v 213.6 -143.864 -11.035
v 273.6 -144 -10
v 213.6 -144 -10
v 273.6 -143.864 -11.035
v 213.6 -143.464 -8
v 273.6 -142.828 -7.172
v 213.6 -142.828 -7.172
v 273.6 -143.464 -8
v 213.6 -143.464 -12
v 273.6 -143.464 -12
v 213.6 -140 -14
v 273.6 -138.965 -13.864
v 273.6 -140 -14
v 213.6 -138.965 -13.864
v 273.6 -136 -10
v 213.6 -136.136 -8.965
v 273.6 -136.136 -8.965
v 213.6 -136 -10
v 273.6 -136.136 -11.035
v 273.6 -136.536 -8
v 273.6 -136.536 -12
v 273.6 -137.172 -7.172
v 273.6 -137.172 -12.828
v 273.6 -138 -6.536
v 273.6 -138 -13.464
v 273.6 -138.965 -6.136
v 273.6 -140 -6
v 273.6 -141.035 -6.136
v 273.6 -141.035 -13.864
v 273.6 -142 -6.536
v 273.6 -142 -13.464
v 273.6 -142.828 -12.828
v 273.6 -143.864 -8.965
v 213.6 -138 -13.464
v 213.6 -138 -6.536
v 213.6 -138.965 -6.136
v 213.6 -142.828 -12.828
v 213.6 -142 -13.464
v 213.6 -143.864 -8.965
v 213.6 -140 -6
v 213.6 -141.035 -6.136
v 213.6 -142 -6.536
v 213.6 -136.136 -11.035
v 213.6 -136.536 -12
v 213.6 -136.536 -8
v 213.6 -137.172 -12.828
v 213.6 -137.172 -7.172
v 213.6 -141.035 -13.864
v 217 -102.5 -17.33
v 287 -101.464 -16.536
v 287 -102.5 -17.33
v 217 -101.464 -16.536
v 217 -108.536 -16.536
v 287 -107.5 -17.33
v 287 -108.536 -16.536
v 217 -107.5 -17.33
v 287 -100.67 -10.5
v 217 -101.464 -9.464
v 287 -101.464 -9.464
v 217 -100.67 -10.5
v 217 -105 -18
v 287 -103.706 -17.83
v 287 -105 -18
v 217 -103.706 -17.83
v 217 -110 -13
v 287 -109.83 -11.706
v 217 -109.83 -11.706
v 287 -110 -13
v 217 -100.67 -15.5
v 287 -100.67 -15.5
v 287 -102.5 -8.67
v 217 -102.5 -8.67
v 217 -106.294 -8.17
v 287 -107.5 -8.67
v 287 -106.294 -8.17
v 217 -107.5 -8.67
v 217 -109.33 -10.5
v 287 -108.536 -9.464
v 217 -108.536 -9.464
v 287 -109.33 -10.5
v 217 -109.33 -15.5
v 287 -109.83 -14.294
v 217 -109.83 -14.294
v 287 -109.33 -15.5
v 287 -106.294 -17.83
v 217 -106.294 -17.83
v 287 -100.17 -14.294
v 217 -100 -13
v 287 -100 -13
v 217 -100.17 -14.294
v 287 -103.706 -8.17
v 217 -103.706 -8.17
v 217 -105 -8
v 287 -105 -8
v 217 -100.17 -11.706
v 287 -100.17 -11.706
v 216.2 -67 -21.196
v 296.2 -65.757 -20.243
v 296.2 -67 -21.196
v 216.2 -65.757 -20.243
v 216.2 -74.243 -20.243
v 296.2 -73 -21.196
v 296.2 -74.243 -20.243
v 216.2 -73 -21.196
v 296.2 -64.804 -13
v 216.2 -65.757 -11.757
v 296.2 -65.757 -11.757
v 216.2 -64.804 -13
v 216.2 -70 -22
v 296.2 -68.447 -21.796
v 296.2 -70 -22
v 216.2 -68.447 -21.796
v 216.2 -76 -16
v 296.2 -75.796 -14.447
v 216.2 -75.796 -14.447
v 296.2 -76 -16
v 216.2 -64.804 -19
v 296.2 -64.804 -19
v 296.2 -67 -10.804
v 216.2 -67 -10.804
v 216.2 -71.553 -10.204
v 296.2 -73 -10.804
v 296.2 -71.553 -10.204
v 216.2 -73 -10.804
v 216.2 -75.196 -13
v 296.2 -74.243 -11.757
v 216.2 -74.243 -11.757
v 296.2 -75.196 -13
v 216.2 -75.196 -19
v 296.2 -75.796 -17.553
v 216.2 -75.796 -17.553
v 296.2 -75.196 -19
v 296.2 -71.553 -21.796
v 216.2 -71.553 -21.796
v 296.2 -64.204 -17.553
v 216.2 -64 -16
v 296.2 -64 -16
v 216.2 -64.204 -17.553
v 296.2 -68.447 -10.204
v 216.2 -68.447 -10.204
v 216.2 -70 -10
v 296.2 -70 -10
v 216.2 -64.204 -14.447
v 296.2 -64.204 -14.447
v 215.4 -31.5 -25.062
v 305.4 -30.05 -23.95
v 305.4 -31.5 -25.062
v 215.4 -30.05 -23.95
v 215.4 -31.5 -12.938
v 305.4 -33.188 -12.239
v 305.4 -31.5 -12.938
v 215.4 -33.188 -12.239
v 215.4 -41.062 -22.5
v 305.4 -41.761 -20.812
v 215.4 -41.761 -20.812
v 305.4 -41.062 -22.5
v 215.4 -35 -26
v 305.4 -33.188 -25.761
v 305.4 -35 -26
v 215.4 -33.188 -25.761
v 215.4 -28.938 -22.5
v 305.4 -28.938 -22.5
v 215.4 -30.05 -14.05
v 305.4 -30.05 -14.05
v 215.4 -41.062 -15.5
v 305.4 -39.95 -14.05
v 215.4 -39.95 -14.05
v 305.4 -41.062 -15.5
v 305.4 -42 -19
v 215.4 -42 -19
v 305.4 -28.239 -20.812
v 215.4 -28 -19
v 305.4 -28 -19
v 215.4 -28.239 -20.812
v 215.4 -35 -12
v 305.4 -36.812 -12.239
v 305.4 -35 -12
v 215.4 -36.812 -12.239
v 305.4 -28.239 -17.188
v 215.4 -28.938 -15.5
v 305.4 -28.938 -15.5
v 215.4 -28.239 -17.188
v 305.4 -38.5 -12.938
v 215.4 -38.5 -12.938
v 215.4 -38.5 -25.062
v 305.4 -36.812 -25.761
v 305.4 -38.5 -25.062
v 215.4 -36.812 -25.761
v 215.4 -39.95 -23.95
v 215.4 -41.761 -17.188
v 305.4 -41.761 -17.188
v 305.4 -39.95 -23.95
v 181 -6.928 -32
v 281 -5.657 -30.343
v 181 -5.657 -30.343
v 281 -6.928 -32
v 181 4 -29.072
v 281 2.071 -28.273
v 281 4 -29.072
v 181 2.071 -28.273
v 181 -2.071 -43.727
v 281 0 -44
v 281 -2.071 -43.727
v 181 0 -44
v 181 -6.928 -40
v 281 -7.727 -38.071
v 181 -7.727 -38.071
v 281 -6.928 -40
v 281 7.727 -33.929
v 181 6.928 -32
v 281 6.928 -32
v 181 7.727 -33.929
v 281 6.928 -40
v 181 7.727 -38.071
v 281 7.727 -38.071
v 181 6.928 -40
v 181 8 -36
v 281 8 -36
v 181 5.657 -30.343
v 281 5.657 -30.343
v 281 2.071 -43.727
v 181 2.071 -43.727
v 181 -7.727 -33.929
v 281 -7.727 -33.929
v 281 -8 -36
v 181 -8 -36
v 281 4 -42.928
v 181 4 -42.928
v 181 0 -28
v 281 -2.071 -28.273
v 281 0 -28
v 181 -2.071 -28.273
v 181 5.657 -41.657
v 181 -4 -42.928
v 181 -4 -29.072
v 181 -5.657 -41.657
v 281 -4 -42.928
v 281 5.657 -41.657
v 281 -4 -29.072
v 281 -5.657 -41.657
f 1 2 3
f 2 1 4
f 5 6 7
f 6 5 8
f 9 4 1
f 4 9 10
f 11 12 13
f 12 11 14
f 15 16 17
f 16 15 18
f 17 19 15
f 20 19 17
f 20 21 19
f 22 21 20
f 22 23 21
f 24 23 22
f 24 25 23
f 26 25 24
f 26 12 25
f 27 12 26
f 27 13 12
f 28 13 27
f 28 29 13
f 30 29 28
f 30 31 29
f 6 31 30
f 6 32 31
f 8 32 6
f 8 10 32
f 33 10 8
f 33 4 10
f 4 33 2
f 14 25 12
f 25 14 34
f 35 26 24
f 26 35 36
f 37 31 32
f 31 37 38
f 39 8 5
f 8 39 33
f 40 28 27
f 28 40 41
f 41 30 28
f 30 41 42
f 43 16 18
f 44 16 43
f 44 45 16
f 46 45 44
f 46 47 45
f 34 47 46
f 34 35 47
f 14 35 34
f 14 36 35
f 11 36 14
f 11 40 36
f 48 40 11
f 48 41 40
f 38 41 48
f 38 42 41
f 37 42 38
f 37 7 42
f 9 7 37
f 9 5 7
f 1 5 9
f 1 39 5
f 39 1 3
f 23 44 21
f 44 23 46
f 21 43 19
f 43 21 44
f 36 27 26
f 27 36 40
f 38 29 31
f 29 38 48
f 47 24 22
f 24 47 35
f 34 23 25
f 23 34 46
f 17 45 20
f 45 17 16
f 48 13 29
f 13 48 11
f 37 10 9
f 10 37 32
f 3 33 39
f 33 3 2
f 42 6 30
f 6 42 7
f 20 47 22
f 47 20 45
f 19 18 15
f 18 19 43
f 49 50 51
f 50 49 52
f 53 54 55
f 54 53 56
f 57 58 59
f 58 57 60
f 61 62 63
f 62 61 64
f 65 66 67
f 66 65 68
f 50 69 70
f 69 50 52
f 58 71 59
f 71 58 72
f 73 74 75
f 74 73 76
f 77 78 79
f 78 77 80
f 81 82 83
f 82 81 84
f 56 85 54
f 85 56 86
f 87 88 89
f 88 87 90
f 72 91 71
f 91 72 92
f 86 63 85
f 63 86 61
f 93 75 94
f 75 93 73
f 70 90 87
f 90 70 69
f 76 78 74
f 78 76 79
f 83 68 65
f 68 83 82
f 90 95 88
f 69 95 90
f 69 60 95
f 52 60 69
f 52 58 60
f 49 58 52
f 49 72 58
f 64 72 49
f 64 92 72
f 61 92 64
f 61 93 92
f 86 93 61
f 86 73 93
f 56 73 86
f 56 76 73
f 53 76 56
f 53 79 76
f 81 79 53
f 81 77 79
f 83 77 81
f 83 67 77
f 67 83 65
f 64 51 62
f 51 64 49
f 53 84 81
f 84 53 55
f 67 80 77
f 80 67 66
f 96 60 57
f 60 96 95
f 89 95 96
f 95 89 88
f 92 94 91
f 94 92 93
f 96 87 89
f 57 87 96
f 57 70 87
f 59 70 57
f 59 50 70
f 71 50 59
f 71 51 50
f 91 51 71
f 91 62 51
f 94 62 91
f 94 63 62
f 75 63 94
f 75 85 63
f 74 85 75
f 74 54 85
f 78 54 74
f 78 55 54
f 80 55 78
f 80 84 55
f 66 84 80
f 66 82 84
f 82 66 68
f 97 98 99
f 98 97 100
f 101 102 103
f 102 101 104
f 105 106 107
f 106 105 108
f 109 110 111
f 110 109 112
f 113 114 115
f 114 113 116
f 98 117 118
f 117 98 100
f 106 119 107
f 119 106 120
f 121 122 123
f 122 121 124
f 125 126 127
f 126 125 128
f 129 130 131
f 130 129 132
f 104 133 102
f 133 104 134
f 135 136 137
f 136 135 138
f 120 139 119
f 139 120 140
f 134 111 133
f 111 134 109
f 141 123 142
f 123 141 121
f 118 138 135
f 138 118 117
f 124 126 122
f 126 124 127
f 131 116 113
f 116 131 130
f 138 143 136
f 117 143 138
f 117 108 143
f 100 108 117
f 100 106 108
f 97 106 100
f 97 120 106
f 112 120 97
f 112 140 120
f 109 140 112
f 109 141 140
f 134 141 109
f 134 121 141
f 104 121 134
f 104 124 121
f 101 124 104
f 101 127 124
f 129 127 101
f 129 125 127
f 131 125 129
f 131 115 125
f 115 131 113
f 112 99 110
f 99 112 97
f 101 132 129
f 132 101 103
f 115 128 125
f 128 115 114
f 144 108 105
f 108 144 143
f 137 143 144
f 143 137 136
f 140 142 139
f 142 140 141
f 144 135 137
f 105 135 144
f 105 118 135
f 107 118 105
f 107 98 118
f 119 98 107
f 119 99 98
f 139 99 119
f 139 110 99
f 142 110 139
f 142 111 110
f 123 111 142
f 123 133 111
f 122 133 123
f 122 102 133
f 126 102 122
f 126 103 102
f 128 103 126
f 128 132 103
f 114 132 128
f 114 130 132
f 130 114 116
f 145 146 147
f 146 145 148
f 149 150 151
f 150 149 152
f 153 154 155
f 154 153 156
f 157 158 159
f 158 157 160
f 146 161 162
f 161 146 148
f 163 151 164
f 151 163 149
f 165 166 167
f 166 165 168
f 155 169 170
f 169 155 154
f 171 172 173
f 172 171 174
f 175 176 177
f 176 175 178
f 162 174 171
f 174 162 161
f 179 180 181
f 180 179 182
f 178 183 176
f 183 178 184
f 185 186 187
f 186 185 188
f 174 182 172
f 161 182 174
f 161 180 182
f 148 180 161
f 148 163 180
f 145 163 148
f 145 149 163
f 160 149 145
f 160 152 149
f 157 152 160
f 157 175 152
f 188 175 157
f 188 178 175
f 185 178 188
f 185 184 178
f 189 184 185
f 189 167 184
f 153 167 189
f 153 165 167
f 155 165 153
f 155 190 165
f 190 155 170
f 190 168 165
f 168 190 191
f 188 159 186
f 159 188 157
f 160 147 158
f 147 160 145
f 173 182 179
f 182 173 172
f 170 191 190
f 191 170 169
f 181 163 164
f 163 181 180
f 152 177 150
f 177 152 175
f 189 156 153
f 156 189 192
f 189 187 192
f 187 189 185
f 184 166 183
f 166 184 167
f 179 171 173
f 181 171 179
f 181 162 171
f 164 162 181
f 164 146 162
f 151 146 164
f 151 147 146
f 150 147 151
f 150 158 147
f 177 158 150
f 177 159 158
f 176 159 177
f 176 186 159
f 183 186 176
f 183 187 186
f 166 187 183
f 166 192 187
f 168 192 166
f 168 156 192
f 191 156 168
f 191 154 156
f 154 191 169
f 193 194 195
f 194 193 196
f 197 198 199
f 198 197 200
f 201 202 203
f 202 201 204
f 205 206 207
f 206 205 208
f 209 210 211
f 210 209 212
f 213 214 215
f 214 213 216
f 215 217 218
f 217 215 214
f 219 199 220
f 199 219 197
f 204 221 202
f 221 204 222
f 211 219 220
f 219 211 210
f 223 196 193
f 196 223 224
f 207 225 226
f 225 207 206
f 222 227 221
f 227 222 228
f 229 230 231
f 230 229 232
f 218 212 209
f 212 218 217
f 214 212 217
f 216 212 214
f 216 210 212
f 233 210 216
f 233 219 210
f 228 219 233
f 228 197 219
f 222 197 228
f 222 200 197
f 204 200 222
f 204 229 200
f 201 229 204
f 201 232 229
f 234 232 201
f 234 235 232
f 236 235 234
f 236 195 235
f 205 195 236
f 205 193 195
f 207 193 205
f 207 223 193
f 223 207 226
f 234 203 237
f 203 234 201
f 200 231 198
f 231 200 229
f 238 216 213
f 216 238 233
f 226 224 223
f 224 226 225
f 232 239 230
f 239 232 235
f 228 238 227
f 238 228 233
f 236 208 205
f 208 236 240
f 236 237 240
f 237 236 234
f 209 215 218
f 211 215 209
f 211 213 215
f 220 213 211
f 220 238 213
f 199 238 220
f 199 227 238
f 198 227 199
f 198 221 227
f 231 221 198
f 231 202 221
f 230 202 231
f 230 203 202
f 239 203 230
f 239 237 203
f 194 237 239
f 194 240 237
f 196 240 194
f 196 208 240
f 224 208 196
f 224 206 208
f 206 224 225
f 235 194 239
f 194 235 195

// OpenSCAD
// file: lib/stores_clearance.scad
// ISM-FJ-1 adjacent-store clearance envelopes — A4 #122
// Study mm. Inert fit / clearance only — no release kinematics.
// Library modules only.

fuselage_length = 420;
function fs_x(pct) = fuselage_length * pct;

// Station BL/WL from hardpoints.yaml; store body = study-scaled class cylinder
// Full-scale AAM-S ~2.9 m × 0.127 m → study ≈ /36.9 → L~79 mm, D~3.4 mm
// Use exaggerated study envelopes for clash visibility at wing stations.

module store_envelope(bl, wl, fs_pct, dia = 8, len = 60) {
    translate([fs_x(fs_pct) - len / 2, bl, wl - dia / 2])
        rotate([0, 90, 0])
            cylinder(h = len, d = dia, $fn = 24);
}

// Tip + outboard adjacent pair (left wing) at max flap/gear deflection stub:
// deflect BL 3 mm toward neighbor to stress clearance gap.
module adjacent_pair_sta1_sta3(deflect_mm = 3) {
    store_envelope(-140 + deflect_mm, -6, 0.58, 8, 60);  // STA-1
    store_envelope(-105 - deflect_mm, -8, 0.60, 10, 70); // STA-3
}

module adjacent_pair_sta3_sta5(deflect_mm = 3) {
    store_envelope(-105 + deflect_mm, -8, 0.60, 10, 70);
    store_envelope(-70 - deflect_mm, -10, 0.61, 12, 80);
}

module adjacent_pair_sta5_sta7(deflect_mm = 3) {
    store_envelope(-70 + deflect_mm, -10, 0.61, 12, 80);
    store_envelope(-35 - deflect_mm, -12, 0.62, 14, 90);
}

module adjacent_pair_sta7_sta9(deflect_mm = 3) {
    store_envelope(-35 + deflect_mm, -12, 0.62, 14, 90);
    store_envelope(0, -28, 0.55, 16, 100);  // STA-9 CL
}

module pair_intersection_1_3() {
    intersection() {
        store_envelope(-140 + 3, -6, 0.58, 8, 60);
        store_envelope(-105 - 3, -8, 0.60, 10, 70);
    }
}

module pair_intersection_3_5() {
    intersection() {
        store_envelope(-105 + 3, -8, 0.60, 10, 70);
        store_envelope(-70 - 3, -10, 0.61, 12, 80);
    }
}

module pair_intersection_5_7() {
    intersection() {
        store_envelope(-70 + 3, -10, 0.61, 12, 80);
        store_envelope(-35 - 3, -12, 0.62, 14, 90);
    }
}

module pair_intersection_7_9() {
    intersection() {
        store_envelope(-35 + 3, -12, 0.62, 14, 90);
        store_envelope(0, -28, 0.55, 16, 100);
    }
}

module all_adjacent_forbidden_intersections() {
    union() {
        pair_intersection_1_3();
        pair_intersection_3_5();
        pair_intersection_5_7();
        pair_intersection_7_9();
    }
}
// main file
// Preview adjacent-station store envelopes (draws geometry for CI render).
include <lib/stores_clearance.scad>

store_envelope(-140, -6, 0.58, 8, 60);
store_envelope(-105, -8, 0.60, 10, 70);
store_envelope(-70, -10, 0.61, 12, 80);
store_envelope(-35, -12, 0.62, 14, 90);
store_envelope(0, -28, 0.55, 16, 100);
